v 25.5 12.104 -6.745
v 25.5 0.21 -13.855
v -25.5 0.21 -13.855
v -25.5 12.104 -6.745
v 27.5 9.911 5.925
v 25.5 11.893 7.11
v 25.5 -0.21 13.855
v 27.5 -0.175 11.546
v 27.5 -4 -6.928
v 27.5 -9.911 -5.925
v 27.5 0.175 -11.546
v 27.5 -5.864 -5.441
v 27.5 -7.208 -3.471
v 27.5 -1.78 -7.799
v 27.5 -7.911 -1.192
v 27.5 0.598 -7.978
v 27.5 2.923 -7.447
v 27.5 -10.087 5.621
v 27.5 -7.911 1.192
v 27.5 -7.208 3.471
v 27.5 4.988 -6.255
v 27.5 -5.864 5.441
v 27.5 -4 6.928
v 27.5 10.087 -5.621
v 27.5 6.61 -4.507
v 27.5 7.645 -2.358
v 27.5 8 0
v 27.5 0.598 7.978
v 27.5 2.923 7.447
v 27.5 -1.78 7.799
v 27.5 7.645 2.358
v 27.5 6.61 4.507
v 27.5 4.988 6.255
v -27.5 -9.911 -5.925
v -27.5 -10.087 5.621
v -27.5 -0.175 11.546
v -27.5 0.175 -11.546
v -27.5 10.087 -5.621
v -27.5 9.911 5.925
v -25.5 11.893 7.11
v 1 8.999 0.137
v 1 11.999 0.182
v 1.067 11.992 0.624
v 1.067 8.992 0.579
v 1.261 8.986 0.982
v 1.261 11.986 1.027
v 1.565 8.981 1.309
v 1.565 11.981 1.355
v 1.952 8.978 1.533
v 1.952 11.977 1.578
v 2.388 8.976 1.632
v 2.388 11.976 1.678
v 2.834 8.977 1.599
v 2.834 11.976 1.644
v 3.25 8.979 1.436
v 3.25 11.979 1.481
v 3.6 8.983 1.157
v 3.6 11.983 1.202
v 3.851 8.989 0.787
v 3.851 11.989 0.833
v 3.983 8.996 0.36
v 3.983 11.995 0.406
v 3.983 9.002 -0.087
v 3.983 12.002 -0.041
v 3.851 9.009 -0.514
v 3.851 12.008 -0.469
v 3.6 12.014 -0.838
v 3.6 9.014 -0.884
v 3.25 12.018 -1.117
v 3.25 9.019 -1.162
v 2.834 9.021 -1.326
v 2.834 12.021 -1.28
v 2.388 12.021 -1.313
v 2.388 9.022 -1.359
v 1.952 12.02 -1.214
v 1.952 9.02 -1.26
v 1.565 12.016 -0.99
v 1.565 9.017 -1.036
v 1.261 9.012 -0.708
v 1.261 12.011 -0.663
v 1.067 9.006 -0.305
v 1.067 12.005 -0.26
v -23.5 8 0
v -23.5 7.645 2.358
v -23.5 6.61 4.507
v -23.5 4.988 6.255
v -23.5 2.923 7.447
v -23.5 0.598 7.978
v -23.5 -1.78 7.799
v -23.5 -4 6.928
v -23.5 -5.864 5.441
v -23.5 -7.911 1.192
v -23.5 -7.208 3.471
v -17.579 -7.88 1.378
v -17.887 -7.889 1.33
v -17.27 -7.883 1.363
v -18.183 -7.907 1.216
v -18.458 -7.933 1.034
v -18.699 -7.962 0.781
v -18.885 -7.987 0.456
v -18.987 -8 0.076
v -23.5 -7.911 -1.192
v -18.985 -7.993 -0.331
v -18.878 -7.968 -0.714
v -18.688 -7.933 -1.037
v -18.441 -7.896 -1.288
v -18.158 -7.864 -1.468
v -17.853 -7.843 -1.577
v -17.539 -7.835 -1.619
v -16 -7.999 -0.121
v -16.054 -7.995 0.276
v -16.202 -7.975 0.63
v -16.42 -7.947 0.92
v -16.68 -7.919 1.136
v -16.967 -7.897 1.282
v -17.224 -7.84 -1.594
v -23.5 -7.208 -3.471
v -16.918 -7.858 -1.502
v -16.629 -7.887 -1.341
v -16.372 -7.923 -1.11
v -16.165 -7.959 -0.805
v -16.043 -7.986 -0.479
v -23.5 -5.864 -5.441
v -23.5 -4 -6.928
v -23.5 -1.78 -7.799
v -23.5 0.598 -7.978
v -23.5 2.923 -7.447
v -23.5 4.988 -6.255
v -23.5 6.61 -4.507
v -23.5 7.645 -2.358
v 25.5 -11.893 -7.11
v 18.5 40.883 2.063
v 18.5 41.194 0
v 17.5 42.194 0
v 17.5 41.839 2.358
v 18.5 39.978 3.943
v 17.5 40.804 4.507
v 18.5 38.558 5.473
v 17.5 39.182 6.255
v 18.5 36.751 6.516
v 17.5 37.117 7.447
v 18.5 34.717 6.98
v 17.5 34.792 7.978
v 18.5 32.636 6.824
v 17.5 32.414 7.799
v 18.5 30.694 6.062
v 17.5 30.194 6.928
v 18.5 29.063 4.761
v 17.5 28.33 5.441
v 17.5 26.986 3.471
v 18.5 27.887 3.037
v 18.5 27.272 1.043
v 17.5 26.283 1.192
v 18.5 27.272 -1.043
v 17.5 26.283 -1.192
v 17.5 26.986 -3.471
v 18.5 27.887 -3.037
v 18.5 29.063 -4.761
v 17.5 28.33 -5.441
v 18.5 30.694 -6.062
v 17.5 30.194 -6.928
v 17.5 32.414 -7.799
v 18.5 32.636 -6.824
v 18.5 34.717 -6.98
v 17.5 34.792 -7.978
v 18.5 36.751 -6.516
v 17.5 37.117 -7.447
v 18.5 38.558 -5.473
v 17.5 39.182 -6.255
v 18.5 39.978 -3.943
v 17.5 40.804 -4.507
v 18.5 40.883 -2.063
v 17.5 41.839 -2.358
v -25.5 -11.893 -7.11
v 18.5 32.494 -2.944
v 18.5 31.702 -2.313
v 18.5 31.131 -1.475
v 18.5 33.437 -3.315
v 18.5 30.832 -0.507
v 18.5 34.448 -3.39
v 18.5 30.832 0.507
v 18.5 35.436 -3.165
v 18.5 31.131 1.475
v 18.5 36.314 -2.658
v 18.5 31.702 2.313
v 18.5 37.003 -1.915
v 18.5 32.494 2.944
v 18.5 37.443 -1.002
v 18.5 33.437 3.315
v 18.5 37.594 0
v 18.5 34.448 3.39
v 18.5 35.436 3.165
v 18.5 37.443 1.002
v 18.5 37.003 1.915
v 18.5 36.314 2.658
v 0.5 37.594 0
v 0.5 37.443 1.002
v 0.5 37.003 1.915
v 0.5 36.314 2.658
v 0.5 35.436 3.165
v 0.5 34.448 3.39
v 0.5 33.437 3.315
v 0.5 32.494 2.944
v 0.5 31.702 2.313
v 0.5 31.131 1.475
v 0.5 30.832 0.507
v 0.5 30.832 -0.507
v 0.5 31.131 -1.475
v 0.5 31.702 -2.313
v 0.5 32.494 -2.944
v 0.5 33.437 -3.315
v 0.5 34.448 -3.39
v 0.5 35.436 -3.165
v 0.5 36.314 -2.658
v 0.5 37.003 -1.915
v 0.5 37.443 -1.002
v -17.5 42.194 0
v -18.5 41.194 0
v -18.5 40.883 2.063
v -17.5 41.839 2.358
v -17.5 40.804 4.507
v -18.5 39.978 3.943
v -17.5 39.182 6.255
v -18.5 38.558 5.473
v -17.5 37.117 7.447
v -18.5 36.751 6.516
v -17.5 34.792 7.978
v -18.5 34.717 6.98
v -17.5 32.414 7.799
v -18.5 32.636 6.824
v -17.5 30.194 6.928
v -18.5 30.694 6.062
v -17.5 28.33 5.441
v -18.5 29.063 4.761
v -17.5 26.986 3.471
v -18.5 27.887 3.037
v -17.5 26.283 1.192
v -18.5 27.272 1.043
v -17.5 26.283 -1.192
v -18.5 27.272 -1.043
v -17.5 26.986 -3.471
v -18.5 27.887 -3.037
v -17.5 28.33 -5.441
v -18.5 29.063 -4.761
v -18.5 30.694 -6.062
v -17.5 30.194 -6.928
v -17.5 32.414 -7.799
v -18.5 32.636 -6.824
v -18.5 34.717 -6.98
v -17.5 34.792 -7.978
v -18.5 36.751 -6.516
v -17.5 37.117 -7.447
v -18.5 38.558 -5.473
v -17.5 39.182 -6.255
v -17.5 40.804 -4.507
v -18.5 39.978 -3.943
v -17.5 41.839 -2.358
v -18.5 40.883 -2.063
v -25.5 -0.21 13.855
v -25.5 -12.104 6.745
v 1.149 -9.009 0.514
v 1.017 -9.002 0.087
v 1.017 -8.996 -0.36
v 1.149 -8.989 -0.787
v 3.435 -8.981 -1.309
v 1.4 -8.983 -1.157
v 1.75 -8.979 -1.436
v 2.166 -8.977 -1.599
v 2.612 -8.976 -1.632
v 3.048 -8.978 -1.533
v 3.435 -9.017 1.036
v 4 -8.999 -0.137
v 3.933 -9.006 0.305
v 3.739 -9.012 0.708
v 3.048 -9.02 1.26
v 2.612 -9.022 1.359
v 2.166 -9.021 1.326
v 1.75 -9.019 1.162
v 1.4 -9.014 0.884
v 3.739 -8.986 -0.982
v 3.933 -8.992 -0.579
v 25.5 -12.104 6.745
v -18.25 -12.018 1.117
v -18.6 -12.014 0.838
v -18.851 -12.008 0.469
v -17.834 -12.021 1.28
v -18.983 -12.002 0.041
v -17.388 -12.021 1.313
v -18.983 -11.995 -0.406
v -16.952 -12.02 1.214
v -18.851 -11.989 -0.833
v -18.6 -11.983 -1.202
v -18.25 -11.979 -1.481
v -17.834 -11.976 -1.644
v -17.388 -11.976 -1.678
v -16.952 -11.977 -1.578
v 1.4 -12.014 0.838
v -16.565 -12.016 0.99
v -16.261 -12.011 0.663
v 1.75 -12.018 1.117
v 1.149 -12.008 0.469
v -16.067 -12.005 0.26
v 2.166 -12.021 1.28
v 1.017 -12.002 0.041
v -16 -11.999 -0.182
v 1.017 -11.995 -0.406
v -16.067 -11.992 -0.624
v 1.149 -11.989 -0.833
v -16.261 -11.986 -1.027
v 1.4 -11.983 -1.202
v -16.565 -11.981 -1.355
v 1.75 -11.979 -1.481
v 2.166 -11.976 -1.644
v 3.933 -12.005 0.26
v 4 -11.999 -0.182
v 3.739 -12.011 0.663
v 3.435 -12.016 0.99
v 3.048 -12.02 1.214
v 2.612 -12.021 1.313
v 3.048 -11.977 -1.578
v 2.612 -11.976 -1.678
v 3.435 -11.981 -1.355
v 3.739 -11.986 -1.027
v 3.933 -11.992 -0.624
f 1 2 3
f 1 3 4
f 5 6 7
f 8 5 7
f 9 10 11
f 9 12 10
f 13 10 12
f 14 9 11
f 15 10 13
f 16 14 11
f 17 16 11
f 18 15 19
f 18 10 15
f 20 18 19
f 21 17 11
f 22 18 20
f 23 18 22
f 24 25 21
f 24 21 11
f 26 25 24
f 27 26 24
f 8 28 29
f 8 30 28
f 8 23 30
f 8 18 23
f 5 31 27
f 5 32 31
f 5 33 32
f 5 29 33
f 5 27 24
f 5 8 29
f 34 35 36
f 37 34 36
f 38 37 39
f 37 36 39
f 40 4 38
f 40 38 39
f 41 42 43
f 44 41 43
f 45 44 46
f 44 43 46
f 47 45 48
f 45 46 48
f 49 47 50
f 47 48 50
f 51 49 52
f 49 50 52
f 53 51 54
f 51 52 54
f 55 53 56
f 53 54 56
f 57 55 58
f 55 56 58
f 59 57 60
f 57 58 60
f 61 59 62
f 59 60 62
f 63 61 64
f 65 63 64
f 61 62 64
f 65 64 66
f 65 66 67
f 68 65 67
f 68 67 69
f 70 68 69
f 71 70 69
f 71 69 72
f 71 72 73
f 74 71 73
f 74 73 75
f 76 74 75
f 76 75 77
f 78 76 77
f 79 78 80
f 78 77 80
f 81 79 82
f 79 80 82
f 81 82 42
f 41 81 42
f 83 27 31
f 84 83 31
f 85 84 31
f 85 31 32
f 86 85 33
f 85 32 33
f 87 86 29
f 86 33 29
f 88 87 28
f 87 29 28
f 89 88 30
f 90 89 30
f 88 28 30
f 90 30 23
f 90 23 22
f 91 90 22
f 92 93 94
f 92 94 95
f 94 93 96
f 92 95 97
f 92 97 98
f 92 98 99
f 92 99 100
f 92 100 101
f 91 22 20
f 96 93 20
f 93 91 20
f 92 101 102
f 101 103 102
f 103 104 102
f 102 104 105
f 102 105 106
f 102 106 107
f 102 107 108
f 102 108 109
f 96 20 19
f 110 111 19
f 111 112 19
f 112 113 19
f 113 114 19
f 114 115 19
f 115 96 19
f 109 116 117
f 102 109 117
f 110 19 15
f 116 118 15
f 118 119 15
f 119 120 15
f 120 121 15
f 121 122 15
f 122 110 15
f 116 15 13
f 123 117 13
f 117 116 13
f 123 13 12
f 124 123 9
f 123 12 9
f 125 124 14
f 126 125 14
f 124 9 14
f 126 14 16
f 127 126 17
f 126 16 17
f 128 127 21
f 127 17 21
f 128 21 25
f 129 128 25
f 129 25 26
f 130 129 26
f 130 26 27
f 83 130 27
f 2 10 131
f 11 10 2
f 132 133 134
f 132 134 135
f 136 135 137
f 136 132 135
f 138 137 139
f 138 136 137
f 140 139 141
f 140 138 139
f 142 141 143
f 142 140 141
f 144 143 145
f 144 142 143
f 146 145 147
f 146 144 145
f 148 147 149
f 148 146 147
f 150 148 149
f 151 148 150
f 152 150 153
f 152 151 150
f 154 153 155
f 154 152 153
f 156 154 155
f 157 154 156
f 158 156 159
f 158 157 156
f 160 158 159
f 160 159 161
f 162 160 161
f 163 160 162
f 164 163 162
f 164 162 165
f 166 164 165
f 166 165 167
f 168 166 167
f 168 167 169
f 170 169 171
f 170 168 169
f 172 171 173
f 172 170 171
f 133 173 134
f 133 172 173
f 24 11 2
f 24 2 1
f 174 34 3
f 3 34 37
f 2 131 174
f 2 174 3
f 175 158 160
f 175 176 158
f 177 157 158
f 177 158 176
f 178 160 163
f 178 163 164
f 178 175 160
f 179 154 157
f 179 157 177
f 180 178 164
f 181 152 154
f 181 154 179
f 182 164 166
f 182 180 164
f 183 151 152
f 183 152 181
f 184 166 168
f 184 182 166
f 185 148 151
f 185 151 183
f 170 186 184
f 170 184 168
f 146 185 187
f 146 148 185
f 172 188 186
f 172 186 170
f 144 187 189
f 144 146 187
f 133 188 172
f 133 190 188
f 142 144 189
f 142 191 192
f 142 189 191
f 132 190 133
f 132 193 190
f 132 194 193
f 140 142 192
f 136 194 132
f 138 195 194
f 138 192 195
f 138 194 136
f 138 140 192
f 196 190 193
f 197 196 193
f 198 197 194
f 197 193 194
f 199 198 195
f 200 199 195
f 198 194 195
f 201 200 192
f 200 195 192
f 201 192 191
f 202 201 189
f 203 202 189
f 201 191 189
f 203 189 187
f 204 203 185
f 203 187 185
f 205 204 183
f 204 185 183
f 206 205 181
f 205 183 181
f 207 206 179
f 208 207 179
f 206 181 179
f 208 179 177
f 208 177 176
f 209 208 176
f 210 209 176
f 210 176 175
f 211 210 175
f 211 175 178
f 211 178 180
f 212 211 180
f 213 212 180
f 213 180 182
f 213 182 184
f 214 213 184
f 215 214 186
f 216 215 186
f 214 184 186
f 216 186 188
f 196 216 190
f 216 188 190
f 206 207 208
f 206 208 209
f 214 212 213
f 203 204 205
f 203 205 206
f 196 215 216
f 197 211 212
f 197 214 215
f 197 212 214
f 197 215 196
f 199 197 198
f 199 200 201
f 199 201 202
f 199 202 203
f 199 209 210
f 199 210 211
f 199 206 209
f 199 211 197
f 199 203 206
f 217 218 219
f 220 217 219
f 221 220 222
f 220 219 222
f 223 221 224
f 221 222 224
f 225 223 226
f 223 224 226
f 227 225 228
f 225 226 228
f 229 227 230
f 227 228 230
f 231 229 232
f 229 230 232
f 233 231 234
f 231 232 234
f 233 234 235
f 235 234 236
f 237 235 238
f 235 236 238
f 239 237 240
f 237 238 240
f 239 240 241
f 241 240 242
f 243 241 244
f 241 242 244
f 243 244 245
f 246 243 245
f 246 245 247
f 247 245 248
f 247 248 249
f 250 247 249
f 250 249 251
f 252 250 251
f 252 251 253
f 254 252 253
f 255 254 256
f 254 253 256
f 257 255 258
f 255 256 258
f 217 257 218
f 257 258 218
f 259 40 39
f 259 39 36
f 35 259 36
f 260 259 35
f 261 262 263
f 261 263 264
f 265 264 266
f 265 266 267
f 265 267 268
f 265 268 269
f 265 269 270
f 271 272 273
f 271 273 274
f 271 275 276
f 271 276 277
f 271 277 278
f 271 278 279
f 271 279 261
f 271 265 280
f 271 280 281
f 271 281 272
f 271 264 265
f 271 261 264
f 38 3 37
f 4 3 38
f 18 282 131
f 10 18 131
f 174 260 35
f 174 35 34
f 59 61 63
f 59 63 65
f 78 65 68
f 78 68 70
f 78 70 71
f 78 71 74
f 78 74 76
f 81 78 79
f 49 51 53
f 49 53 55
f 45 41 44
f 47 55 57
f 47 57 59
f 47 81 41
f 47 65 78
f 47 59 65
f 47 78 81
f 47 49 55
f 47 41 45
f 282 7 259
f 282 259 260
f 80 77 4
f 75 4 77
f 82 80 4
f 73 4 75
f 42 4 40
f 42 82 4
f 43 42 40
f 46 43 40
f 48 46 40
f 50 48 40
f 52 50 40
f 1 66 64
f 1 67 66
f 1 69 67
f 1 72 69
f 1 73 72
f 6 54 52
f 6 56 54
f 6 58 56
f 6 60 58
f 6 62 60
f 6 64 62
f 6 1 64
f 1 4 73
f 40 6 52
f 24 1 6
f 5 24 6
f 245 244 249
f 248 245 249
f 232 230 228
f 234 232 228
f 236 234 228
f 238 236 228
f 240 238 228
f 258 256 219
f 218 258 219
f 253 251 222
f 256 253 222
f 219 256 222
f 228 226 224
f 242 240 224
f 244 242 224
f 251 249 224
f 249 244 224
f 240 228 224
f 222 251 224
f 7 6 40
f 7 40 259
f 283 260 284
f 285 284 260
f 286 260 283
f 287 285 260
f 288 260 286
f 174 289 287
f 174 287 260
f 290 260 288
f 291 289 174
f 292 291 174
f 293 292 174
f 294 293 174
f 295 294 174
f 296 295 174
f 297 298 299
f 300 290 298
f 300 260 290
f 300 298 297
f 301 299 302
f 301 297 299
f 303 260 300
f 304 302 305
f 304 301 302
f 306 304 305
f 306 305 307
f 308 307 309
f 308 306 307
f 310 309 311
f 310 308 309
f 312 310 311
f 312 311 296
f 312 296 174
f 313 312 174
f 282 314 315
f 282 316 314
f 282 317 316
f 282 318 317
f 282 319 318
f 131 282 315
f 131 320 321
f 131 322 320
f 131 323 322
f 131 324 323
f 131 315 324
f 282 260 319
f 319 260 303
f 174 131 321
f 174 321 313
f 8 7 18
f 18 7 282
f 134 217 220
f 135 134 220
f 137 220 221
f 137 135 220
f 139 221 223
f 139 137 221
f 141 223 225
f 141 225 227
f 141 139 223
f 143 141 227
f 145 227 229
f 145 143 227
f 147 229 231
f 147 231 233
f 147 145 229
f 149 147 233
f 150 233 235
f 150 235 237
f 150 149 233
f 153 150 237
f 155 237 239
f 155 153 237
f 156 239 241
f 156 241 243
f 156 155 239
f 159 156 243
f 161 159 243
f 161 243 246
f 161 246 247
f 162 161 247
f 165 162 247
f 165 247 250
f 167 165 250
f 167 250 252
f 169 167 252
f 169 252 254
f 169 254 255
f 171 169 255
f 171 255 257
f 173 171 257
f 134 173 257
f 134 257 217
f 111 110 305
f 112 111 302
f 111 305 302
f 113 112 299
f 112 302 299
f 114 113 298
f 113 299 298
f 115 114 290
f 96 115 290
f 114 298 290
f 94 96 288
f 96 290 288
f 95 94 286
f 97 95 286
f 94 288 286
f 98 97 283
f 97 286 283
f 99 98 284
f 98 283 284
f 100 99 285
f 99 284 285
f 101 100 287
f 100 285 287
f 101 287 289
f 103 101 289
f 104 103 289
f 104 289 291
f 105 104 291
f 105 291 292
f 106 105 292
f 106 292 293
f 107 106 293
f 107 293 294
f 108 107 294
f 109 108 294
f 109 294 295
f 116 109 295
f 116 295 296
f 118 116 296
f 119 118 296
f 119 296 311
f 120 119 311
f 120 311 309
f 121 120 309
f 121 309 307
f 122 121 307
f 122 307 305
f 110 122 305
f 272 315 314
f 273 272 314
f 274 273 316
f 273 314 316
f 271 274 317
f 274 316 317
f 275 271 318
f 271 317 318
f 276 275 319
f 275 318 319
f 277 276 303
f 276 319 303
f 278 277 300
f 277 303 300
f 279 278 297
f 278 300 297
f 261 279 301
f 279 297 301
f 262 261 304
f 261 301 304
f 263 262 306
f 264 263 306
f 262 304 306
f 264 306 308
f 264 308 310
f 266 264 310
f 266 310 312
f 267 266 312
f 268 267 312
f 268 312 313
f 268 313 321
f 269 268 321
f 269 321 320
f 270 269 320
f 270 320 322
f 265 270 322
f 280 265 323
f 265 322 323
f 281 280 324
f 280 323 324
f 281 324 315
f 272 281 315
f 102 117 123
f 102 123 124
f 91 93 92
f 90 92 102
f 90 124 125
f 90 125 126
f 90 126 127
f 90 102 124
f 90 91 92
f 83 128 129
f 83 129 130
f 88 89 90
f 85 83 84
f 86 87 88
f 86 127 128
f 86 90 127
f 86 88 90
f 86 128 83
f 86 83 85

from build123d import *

# Parameters (mm, degrees)
F1_DEPTH  = 27.5
F2_R      = 8
F3_DEPTH  = 51
F5_DEPTH  = 3
F6_R      = 1.5
F7_DEPTH  = 5
F8_R      = 1.5
F9_DEPTH  = 3
F10_SIZE  = 2
F11_R     = 8
F12_DEPTH = 18.5
F13_R     = 3.4
F14_DEPTH = 18
F15_SIZE  = 1


with BuildPart() as f1:
    # F0 (on Right) → F1 (new body, symmetric)
    with BuildSketch(Plane.YZ):
        Polygon((-11.8934309535, -7.1095921229), (0.2103719122, -13.8548094053), (12.1038028657, -6.7452172825), (11.8934309535, 7.1095921229), (-0.2103719122, 13.8548094053), (-12.1038028657, 6.7452172825), align=None)
    extrude(amount=F1_DEPTH, both=True)

    # F2 (on face) → F3 (cut)
    with BuildSketch(Plane.YZ.offset(27.5)):
        Circle(F2_R)
    extrude(amount=-F3_DEPTH, mode=Mode.SUBTRACT)

    # F4 (on face) → F5 (cut)
    with BuildSketch(Plane(origin=(0, -11.9986169096, -0.1821874202), x_dir=(1, 0, 0), z_dir=(0, -0.9998847425, -0.015182285))):
        with BuildLine():
            ThreePointArc((1, 0), (2.5, -1.5), (4, 0))
            ThreePointArc((4, 0), (2.5, 1.5), (1, 0))
        make_face()
    extrude(amount=-F5_DEPTH, mode=Mode.SUBTRACT)

    # F6 (on face) → F7 (cut)
    with BuildSketch(Plane(origin=(0, -11.9986169096, -0.1821874202), x_dir=(1, 0, 0), z_dir=(0, -0.9998847425, -0.015182285))):
        with Locations((-17.5, 0)):
            Circle(F6_R)
    extrude(amount=-F7_DEPTH, mode=Mode.SUBTRACT)

    # F8 (on face) → F9 (cut)
    with BuildSketch(Plane(origin=(0, 11.9986169096, 0.1821874202), x_dir=(-1, 0, 0), z_dir=(0, 0.9998847425, 0.015182285))):
        with Locations((-2.5, 0)):
            Circle(F8_R)
    extrude(amount=-F9_DEPTH, mode=Mode.SUBTRACT)

    # F10
    f10_edges = [f1.edges().sort_by_distance(p)[0] for p in [
        (27.5, -6.157087, 10.300013),
        (27.5, -11.998617, -0.182187),
        (27.5, -5.84153, -10.482201),
        (27.5, 6.157087, -10.300013),
        (27.5, 11.998617, 0.182187),
        (27.5, 5.84153, 10.482201),
        (-27.5, 5.84153, 10.482201),
        (-27.5, -6.157087, 10.300013),
        (-27.5, -11.998617, -0.182187),
        (-27.5, -5.84153, -10.482201),
        (-27.5, 6.157087, -10.300013),
        (-27.5, 11.998617, 0.182187),
    ]]
    chamfer(f10_edges, length=F10_SIZE)


with BuildPart() as f12:
    # F11 (on Right) → F12 (new body, symmetric)
    with BuildSketch(Plane.YZ):
        with Locations((34.1939330101, 0)):
            Circle(F11_R)
    extrude(amount=F12_DEPTH, both=True)

    # F13 (on face) → F14 (cut)
    with BuildSketch(Plane.YZ.offset(18.5)):
        with Locations((34.1939330101, 0)):
            Circle(F13_R)
    extrude(amount=-F14_DEPTH, mode=Mode.SUBTRACT)

    # F15
    f15_edges = [f12.edges().sort_by_distance(p)[0] for p in [
        (18.5, 26.193933, 0),
        (-18.5, 26.193933, 0),
    ]]
    chamfer(f15_edges, length=F15_SIZE)


solid = Compound([f1.part, f12.part])
